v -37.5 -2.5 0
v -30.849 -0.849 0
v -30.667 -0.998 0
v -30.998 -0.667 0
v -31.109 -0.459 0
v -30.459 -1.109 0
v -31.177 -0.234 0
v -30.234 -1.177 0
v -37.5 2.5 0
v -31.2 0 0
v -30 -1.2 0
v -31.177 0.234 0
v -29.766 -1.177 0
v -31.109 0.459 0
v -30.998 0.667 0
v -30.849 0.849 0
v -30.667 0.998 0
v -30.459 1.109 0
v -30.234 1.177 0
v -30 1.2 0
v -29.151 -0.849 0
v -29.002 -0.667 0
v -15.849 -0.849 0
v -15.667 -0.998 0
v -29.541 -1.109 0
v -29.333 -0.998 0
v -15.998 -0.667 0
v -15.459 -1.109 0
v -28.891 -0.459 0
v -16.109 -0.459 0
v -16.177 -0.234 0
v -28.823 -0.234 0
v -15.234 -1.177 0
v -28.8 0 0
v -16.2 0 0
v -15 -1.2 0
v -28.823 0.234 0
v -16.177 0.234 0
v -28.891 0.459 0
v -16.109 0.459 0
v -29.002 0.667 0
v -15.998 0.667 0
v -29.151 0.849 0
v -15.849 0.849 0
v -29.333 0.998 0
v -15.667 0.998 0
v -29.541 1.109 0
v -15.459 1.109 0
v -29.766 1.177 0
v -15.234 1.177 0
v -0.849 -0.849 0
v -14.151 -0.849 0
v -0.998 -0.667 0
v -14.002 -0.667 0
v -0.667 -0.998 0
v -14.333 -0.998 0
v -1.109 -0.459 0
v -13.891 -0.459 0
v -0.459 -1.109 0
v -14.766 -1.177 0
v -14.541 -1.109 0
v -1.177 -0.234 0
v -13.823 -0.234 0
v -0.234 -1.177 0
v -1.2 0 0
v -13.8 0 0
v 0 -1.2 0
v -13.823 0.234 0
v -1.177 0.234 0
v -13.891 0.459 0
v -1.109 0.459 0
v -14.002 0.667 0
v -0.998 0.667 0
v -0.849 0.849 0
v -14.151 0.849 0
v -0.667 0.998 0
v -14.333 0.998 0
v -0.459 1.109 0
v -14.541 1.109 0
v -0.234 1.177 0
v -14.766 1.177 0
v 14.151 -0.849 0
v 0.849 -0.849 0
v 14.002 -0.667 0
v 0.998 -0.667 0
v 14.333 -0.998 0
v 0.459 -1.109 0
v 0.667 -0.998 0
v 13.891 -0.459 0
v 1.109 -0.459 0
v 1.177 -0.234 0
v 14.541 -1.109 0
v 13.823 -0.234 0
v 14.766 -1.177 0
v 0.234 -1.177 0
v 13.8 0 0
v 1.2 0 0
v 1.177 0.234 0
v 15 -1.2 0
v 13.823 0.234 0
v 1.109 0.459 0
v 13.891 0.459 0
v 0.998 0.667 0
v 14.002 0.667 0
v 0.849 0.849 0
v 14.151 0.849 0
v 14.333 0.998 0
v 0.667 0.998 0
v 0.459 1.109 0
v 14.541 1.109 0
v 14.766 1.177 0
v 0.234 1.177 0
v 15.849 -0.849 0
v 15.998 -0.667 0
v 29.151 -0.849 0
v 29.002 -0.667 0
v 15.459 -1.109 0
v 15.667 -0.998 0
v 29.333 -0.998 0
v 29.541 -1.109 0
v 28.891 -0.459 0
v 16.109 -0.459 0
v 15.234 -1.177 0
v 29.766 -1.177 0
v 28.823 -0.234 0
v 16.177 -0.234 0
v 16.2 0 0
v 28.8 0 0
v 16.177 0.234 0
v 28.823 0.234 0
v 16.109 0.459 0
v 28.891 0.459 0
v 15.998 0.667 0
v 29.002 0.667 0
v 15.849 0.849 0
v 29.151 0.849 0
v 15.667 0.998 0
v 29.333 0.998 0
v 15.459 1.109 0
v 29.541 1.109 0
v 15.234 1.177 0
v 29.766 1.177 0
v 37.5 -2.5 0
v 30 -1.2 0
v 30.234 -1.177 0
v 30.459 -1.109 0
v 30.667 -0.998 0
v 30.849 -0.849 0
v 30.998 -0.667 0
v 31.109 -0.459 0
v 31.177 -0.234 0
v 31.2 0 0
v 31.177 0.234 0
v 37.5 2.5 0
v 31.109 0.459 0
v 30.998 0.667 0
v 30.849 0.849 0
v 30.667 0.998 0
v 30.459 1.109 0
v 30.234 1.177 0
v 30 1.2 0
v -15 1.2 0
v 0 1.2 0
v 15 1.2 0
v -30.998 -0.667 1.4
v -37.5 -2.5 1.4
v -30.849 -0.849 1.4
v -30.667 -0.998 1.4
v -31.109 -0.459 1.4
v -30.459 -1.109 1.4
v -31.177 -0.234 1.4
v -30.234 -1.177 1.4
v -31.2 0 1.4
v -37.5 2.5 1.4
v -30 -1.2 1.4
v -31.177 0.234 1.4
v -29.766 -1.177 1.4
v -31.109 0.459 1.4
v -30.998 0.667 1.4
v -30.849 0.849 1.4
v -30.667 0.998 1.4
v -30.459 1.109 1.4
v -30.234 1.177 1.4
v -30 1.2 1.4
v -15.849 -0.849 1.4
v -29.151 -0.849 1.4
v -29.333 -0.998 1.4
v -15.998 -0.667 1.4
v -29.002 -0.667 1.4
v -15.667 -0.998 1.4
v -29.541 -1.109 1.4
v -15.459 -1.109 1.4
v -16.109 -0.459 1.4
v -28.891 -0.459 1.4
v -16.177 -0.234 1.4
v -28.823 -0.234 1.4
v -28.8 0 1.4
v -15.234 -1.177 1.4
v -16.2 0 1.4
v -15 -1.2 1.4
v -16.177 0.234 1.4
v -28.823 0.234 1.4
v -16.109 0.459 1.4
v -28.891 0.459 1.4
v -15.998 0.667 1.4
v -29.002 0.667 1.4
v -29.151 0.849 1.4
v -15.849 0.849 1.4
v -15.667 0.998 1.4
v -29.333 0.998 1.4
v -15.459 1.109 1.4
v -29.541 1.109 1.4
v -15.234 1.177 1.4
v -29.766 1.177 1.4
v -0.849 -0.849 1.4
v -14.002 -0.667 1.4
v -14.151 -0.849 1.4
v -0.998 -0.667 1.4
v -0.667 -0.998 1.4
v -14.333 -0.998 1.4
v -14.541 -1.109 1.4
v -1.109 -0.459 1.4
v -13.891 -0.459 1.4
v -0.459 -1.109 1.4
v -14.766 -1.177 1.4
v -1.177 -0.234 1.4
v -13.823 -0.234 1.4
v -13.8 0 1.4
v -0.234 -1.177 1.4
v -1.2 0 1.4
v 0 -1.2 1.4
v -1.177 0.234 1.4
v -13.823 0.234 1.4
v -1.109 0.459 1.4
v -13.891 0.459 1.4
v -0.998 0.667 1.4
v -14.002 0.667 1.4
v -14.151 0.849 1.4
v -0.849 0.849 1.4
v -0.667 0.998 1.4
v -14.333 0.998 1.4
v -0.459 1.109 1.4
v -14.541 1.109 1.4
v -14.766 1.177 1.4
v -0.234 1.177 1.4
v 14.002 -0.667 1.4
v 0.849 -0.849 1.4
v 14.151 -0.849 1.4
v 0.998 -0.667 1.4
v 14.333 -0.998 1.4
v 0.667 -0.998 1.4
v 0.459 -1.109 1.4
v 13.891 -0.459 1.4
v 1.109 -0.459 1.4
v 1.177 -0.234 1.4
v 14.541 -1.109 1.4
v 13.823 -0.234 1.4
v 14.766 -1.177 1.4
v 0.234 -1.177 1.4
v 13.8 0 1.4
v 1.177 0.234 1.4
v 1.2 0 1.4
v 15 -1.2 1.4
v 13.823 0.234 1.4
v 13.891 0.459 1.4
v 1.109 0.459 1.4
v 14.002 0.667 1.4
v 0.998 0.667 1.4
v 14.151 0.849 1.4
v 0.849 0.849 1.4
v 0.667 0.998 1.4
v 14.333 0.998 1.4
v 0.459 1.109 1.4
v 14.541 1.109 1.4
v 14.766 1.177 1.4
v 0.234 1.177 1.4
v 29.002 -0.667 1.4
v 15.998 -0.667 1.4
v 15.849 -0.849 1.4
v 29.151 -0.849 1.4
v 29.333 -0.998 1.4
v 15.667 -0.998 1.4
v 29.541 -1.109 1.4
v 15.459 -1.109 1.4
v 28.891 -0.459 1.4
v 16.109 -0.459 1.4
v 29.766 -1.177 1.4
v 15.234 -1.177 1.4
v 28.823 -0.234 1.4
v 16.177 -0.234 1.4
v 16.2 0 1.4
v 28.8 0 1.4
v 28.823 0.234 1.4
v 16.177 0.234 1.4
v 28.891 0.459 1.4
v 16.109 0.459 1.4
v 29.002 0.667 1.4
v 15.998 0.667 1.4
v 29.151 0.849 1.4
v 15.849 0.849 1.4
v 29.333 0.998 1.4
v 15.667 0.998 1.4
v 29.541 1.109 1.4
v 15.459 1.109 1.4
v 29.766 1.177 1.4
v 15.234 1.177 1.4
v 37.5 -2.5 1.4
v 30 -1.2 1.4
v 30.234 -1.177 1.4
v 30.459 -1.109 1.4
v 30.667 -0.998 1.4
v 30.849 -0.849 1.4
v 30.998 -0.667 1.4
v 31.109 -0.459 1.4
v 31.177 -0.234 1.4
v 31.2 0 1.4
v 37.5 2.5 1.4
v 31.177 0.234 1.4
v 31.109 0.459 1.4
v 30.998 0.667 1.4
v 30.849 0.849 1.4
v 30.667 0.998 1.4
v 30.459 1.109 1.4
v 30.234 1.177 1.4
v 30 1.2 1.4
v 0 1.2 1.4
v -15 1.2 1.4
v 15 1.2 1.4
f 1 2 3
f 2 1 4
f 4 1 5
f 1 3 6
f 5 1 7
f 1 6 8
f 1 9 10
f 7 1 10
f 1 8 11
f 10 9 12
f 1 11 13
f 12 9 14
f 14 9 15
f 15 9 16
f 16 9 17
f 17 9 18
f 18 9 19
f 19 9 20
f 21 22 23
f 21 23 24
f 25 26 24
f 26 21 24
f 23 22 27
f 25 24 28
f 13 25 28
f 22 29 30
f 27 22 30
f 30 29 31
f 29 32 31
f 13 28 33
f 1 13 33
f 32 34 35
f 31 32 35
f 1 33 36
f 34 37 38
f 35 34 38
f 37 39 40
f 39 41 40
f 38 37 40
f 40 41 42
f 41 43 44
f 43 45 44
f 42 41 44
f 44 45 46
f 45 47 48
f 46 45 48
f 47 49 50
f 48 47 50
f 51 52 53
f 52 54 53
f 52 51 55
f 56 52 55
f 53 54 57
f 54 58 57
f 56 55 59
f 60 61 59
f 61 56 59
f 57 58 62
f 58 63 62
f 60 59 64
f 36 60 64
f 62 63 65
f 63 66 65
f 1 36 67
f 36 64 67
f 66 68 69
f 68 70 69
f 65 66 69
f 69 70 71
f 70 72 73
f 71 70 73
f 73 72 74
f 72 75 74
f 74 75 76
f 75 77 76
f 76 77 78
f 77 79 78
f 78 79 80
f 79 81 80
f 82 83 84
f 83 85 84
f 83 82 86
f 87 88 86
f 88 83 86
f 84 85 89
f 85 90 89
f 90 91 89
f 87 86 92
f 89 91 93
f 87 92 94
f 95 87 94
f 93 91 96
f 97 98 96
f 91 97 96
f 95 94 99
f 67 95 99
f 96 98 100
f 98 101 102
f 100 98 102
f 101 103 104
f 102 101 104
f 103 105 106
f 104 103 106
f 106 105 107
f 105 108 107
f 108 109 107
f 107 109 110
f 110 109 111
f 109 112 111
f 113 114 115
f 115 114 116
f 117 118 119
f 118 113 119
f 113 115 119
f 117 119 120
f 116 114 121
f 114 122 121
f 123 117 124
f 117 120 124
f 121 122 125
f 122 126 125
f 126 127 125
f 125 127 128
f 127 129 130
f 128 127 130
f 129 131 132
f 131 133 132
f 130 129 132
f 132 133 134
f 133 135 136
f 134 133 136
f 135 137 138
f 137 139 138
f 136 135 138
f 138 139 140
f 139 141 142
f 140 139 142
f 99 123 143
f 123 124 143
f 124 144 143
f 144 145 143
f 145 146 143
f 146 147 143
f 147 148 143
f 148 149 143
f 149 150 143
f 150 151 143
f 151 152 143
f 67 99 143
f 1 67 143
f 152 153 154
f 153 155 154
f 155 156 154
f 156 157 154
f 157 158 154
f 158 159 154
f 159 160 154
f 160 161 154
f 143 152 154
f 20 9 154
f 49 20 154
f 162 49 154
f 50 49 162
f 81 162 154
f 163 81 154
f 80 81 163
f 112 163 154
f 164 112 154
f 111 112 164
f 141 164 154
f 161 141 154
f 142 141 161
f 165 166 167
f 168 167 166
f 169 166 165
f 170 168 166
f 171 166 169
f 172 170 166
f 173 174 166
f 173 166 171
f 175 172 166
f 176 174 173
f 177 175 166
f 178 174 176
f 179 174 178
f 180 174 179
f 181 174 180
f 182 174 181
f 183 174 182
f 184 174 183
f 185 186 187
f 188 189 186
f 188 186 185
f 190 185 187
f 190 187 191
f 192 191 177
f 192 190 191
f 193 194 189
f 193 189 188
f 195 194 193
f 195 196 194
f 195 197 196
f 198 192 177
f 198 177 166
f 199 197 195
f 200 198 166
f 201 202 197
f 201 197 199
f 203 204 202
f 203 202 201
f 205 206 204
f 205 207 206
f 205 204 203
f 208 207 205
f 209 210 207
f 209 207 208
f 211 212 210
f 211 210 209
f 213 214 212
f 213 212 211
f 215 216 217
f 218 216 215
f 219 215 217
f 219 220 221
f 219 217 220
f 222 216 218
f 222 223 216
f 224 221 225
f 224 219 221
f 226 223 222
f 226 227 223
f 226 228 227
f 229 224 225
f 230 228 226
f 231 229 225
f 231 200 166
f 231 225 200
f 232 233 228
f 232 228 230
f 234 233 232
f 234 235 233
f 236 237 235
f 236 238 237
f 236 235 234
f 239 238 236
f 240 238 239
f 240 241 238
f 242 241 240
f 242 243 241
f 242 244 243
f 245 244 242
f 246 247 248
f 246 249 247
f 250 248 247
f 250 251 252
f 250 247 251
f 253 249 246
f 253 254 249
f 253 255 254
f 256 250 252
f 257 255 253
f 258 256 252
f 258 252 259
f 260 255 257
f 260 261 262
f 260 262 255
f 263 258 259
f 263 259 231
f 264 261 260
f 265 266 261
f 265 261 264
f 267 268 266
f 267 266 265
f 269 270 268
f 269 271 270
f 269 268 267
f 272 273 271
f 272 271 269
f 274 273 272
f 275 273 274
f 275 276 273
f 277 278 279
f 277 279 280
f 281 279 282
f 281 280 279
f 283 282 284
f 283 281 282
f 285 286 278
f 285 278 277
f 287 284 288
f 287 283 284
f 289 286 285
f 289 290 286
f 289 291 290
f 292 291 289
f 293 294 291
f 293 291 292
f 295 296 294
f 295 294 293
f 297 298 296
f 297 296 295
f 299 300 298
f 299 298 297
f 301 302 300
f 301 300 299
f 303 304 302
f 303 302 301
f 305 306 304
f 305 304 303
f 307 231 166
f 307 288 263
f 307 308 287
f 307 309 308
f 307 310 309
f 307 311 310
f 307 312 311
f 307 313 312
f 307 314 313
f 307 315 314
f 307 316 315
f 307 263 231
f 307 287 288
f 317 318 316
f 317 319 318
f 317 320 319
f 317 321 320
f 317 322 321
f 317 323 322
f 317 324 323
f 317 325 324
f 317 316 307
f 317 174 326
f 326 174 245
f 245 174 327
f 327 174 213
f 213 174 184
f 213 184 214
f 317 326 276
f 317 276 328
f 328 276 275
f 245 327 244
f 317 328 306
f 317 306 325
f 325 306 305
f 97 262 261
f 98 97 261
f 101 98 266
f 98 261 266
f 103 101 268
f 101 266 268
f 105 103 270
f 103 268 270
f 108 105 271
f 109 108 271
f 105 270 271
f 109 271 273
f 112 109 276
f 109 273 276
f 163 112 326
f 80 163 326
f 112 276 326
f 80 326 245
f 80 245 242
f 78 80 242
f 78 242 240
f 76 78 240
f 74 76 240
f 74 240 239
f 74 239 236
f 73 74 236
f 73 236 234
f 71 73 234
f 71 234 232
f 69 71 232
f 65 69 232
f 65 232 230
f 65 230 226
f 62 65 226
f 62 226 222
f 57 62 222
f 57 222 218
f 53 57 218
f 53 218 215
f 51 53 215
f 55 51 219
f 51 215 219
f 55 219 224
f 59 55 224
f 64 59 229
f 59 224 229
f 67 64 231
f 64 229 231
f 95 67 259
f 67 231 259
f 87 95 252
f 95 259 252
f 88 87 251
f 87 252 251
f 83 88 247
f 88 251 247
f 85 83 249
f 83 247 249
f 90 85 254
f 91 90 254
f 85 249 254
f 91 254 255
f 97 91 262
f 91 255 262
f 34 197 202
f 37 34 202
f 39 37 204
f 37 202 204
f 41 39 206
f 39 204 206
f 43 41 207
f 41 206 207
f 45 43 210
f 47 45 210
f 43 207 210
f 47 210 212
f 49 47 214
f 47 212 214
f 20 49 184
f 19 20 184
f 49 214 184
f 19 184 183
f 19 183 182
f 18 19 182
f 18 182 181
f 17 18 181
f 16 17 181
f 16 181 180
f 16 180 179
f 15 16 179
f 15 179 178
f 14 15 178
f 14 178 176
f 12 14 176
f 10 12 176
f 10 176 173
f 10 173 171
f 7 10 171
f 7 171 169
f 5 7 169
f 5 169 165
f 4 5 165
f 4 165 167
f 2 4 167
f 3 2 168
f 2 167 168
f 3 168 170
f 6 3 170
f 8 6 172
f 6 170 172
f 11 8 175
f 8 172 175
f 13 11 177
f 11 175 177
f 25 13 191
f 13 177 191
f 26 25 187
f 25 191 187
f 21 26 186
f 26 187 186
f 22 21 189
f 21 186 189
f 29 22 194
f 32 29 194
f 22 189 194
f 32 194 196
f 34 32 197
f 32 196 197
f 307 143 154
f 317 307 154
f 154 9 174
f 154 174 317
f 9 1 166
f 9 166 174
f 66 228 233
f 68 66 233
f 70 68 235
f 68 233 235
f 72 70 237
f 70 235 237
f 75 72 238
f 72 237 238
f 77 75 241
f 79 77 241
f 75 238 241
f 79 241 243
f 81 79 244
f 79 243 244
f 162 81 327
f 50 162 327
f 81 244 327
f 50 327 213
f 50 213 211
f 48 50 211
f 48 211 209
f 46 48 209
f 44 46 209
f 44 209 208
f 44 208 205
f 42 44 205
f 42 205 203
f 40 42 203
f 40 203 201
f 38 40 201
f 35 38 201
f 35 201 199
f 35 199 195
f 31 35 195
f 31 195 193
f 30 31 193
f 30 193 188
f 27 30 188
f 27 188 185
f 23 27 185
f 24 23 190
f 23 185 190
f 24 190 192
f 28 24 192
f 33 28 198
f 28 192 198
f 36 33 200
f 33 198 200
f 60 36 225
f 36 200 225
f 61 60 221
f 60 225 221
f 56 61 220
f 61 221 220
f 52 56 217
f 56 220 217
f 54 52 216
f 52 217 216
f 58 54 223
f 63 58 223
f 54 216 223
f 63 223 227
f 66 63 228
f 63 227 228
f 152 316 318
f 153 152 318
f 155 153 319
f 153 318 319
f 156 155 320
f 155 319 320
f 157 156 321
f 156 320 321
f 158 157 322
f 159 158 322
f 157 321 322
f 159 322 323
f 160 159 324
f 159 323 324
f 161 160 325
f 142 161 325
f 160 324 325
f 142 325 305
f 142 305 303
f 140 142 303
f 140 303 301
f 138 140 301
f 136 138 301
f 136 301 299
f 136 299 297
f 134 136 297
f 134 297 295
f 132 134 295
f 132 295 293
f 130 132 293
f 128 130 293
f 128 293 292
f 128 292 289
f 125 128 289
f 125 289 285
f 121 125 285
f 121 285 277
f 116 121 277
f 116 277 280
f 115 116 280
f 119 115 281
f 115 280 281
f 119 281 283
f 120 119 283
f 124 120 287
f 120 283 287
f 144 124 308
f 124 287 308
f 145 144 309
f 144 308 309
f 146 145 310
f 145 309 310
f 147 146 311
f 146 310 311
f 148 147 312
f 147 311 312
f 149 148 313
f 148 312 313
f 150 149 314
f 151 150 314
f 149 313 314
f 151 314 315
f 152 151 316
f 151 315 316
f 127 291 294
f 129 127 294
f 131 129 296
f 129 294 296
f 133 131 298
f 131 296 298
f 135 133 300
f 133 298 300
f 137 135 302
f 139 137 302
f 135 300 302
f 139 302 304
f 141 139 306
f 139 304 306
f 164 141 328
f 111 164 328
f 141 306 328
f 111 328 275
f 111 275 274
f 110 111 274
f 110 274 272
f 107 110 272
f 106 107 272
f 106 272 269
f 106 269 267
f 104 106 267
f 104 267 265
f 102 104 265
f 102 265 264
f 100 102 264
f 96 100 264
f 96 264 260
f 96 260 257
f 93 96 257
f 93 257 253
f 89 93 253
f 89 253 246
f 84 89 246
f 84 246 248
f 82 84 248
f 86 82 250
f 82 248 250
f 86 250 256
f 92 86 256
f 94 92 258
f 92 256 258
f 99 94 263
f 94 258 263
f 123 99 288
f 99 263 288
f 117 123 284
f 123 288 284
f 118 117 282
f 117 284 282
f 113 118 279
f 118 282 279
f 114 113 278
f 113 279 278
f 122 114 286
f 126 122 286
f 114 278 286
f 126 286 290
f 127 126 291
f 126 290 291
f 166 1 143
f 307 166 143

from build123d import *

# Parameters (mm, degrees)
SKETCH_1_W          = 75
SKETCH_1_H          = 5
EXTRUDE_1_DEPTH     = 1.4
SKETCH_2_R          = 1.2
CUT_EXTRUDE_1_DEPTH = 51.4


with BuildPart() as part:
    # 草图1 → 凸台-拉伸1 (new body)
    with BuildSketch(Plane.XY):
        Rectangle(SKETCH_1_W, SKETCH_1_H)
    extrude(amount=EXTRUDE_1_DEPTH)

    # 草图2 → 切除-拉伸1 (cut)
    with BuildSketch(Plane.XY.offset(1.4)):
        with Locations((-30, 0)):
            Circle(SKETCH_2_R)
        with Locations((-15, 0)):
            Circle(SKETCH_2_R)
        Circle(SKETCH_2_R)
        with Locations((15, 0)):
            Circle(SKETCH_2_R)
        with Locations((30, 0)):
            Circle(SKETCH_2_R)
    extrude(amount=-CUT_EXTRUDE_1_DEPTH, mode=Mode.SUBTRACT)


solid = part.part
